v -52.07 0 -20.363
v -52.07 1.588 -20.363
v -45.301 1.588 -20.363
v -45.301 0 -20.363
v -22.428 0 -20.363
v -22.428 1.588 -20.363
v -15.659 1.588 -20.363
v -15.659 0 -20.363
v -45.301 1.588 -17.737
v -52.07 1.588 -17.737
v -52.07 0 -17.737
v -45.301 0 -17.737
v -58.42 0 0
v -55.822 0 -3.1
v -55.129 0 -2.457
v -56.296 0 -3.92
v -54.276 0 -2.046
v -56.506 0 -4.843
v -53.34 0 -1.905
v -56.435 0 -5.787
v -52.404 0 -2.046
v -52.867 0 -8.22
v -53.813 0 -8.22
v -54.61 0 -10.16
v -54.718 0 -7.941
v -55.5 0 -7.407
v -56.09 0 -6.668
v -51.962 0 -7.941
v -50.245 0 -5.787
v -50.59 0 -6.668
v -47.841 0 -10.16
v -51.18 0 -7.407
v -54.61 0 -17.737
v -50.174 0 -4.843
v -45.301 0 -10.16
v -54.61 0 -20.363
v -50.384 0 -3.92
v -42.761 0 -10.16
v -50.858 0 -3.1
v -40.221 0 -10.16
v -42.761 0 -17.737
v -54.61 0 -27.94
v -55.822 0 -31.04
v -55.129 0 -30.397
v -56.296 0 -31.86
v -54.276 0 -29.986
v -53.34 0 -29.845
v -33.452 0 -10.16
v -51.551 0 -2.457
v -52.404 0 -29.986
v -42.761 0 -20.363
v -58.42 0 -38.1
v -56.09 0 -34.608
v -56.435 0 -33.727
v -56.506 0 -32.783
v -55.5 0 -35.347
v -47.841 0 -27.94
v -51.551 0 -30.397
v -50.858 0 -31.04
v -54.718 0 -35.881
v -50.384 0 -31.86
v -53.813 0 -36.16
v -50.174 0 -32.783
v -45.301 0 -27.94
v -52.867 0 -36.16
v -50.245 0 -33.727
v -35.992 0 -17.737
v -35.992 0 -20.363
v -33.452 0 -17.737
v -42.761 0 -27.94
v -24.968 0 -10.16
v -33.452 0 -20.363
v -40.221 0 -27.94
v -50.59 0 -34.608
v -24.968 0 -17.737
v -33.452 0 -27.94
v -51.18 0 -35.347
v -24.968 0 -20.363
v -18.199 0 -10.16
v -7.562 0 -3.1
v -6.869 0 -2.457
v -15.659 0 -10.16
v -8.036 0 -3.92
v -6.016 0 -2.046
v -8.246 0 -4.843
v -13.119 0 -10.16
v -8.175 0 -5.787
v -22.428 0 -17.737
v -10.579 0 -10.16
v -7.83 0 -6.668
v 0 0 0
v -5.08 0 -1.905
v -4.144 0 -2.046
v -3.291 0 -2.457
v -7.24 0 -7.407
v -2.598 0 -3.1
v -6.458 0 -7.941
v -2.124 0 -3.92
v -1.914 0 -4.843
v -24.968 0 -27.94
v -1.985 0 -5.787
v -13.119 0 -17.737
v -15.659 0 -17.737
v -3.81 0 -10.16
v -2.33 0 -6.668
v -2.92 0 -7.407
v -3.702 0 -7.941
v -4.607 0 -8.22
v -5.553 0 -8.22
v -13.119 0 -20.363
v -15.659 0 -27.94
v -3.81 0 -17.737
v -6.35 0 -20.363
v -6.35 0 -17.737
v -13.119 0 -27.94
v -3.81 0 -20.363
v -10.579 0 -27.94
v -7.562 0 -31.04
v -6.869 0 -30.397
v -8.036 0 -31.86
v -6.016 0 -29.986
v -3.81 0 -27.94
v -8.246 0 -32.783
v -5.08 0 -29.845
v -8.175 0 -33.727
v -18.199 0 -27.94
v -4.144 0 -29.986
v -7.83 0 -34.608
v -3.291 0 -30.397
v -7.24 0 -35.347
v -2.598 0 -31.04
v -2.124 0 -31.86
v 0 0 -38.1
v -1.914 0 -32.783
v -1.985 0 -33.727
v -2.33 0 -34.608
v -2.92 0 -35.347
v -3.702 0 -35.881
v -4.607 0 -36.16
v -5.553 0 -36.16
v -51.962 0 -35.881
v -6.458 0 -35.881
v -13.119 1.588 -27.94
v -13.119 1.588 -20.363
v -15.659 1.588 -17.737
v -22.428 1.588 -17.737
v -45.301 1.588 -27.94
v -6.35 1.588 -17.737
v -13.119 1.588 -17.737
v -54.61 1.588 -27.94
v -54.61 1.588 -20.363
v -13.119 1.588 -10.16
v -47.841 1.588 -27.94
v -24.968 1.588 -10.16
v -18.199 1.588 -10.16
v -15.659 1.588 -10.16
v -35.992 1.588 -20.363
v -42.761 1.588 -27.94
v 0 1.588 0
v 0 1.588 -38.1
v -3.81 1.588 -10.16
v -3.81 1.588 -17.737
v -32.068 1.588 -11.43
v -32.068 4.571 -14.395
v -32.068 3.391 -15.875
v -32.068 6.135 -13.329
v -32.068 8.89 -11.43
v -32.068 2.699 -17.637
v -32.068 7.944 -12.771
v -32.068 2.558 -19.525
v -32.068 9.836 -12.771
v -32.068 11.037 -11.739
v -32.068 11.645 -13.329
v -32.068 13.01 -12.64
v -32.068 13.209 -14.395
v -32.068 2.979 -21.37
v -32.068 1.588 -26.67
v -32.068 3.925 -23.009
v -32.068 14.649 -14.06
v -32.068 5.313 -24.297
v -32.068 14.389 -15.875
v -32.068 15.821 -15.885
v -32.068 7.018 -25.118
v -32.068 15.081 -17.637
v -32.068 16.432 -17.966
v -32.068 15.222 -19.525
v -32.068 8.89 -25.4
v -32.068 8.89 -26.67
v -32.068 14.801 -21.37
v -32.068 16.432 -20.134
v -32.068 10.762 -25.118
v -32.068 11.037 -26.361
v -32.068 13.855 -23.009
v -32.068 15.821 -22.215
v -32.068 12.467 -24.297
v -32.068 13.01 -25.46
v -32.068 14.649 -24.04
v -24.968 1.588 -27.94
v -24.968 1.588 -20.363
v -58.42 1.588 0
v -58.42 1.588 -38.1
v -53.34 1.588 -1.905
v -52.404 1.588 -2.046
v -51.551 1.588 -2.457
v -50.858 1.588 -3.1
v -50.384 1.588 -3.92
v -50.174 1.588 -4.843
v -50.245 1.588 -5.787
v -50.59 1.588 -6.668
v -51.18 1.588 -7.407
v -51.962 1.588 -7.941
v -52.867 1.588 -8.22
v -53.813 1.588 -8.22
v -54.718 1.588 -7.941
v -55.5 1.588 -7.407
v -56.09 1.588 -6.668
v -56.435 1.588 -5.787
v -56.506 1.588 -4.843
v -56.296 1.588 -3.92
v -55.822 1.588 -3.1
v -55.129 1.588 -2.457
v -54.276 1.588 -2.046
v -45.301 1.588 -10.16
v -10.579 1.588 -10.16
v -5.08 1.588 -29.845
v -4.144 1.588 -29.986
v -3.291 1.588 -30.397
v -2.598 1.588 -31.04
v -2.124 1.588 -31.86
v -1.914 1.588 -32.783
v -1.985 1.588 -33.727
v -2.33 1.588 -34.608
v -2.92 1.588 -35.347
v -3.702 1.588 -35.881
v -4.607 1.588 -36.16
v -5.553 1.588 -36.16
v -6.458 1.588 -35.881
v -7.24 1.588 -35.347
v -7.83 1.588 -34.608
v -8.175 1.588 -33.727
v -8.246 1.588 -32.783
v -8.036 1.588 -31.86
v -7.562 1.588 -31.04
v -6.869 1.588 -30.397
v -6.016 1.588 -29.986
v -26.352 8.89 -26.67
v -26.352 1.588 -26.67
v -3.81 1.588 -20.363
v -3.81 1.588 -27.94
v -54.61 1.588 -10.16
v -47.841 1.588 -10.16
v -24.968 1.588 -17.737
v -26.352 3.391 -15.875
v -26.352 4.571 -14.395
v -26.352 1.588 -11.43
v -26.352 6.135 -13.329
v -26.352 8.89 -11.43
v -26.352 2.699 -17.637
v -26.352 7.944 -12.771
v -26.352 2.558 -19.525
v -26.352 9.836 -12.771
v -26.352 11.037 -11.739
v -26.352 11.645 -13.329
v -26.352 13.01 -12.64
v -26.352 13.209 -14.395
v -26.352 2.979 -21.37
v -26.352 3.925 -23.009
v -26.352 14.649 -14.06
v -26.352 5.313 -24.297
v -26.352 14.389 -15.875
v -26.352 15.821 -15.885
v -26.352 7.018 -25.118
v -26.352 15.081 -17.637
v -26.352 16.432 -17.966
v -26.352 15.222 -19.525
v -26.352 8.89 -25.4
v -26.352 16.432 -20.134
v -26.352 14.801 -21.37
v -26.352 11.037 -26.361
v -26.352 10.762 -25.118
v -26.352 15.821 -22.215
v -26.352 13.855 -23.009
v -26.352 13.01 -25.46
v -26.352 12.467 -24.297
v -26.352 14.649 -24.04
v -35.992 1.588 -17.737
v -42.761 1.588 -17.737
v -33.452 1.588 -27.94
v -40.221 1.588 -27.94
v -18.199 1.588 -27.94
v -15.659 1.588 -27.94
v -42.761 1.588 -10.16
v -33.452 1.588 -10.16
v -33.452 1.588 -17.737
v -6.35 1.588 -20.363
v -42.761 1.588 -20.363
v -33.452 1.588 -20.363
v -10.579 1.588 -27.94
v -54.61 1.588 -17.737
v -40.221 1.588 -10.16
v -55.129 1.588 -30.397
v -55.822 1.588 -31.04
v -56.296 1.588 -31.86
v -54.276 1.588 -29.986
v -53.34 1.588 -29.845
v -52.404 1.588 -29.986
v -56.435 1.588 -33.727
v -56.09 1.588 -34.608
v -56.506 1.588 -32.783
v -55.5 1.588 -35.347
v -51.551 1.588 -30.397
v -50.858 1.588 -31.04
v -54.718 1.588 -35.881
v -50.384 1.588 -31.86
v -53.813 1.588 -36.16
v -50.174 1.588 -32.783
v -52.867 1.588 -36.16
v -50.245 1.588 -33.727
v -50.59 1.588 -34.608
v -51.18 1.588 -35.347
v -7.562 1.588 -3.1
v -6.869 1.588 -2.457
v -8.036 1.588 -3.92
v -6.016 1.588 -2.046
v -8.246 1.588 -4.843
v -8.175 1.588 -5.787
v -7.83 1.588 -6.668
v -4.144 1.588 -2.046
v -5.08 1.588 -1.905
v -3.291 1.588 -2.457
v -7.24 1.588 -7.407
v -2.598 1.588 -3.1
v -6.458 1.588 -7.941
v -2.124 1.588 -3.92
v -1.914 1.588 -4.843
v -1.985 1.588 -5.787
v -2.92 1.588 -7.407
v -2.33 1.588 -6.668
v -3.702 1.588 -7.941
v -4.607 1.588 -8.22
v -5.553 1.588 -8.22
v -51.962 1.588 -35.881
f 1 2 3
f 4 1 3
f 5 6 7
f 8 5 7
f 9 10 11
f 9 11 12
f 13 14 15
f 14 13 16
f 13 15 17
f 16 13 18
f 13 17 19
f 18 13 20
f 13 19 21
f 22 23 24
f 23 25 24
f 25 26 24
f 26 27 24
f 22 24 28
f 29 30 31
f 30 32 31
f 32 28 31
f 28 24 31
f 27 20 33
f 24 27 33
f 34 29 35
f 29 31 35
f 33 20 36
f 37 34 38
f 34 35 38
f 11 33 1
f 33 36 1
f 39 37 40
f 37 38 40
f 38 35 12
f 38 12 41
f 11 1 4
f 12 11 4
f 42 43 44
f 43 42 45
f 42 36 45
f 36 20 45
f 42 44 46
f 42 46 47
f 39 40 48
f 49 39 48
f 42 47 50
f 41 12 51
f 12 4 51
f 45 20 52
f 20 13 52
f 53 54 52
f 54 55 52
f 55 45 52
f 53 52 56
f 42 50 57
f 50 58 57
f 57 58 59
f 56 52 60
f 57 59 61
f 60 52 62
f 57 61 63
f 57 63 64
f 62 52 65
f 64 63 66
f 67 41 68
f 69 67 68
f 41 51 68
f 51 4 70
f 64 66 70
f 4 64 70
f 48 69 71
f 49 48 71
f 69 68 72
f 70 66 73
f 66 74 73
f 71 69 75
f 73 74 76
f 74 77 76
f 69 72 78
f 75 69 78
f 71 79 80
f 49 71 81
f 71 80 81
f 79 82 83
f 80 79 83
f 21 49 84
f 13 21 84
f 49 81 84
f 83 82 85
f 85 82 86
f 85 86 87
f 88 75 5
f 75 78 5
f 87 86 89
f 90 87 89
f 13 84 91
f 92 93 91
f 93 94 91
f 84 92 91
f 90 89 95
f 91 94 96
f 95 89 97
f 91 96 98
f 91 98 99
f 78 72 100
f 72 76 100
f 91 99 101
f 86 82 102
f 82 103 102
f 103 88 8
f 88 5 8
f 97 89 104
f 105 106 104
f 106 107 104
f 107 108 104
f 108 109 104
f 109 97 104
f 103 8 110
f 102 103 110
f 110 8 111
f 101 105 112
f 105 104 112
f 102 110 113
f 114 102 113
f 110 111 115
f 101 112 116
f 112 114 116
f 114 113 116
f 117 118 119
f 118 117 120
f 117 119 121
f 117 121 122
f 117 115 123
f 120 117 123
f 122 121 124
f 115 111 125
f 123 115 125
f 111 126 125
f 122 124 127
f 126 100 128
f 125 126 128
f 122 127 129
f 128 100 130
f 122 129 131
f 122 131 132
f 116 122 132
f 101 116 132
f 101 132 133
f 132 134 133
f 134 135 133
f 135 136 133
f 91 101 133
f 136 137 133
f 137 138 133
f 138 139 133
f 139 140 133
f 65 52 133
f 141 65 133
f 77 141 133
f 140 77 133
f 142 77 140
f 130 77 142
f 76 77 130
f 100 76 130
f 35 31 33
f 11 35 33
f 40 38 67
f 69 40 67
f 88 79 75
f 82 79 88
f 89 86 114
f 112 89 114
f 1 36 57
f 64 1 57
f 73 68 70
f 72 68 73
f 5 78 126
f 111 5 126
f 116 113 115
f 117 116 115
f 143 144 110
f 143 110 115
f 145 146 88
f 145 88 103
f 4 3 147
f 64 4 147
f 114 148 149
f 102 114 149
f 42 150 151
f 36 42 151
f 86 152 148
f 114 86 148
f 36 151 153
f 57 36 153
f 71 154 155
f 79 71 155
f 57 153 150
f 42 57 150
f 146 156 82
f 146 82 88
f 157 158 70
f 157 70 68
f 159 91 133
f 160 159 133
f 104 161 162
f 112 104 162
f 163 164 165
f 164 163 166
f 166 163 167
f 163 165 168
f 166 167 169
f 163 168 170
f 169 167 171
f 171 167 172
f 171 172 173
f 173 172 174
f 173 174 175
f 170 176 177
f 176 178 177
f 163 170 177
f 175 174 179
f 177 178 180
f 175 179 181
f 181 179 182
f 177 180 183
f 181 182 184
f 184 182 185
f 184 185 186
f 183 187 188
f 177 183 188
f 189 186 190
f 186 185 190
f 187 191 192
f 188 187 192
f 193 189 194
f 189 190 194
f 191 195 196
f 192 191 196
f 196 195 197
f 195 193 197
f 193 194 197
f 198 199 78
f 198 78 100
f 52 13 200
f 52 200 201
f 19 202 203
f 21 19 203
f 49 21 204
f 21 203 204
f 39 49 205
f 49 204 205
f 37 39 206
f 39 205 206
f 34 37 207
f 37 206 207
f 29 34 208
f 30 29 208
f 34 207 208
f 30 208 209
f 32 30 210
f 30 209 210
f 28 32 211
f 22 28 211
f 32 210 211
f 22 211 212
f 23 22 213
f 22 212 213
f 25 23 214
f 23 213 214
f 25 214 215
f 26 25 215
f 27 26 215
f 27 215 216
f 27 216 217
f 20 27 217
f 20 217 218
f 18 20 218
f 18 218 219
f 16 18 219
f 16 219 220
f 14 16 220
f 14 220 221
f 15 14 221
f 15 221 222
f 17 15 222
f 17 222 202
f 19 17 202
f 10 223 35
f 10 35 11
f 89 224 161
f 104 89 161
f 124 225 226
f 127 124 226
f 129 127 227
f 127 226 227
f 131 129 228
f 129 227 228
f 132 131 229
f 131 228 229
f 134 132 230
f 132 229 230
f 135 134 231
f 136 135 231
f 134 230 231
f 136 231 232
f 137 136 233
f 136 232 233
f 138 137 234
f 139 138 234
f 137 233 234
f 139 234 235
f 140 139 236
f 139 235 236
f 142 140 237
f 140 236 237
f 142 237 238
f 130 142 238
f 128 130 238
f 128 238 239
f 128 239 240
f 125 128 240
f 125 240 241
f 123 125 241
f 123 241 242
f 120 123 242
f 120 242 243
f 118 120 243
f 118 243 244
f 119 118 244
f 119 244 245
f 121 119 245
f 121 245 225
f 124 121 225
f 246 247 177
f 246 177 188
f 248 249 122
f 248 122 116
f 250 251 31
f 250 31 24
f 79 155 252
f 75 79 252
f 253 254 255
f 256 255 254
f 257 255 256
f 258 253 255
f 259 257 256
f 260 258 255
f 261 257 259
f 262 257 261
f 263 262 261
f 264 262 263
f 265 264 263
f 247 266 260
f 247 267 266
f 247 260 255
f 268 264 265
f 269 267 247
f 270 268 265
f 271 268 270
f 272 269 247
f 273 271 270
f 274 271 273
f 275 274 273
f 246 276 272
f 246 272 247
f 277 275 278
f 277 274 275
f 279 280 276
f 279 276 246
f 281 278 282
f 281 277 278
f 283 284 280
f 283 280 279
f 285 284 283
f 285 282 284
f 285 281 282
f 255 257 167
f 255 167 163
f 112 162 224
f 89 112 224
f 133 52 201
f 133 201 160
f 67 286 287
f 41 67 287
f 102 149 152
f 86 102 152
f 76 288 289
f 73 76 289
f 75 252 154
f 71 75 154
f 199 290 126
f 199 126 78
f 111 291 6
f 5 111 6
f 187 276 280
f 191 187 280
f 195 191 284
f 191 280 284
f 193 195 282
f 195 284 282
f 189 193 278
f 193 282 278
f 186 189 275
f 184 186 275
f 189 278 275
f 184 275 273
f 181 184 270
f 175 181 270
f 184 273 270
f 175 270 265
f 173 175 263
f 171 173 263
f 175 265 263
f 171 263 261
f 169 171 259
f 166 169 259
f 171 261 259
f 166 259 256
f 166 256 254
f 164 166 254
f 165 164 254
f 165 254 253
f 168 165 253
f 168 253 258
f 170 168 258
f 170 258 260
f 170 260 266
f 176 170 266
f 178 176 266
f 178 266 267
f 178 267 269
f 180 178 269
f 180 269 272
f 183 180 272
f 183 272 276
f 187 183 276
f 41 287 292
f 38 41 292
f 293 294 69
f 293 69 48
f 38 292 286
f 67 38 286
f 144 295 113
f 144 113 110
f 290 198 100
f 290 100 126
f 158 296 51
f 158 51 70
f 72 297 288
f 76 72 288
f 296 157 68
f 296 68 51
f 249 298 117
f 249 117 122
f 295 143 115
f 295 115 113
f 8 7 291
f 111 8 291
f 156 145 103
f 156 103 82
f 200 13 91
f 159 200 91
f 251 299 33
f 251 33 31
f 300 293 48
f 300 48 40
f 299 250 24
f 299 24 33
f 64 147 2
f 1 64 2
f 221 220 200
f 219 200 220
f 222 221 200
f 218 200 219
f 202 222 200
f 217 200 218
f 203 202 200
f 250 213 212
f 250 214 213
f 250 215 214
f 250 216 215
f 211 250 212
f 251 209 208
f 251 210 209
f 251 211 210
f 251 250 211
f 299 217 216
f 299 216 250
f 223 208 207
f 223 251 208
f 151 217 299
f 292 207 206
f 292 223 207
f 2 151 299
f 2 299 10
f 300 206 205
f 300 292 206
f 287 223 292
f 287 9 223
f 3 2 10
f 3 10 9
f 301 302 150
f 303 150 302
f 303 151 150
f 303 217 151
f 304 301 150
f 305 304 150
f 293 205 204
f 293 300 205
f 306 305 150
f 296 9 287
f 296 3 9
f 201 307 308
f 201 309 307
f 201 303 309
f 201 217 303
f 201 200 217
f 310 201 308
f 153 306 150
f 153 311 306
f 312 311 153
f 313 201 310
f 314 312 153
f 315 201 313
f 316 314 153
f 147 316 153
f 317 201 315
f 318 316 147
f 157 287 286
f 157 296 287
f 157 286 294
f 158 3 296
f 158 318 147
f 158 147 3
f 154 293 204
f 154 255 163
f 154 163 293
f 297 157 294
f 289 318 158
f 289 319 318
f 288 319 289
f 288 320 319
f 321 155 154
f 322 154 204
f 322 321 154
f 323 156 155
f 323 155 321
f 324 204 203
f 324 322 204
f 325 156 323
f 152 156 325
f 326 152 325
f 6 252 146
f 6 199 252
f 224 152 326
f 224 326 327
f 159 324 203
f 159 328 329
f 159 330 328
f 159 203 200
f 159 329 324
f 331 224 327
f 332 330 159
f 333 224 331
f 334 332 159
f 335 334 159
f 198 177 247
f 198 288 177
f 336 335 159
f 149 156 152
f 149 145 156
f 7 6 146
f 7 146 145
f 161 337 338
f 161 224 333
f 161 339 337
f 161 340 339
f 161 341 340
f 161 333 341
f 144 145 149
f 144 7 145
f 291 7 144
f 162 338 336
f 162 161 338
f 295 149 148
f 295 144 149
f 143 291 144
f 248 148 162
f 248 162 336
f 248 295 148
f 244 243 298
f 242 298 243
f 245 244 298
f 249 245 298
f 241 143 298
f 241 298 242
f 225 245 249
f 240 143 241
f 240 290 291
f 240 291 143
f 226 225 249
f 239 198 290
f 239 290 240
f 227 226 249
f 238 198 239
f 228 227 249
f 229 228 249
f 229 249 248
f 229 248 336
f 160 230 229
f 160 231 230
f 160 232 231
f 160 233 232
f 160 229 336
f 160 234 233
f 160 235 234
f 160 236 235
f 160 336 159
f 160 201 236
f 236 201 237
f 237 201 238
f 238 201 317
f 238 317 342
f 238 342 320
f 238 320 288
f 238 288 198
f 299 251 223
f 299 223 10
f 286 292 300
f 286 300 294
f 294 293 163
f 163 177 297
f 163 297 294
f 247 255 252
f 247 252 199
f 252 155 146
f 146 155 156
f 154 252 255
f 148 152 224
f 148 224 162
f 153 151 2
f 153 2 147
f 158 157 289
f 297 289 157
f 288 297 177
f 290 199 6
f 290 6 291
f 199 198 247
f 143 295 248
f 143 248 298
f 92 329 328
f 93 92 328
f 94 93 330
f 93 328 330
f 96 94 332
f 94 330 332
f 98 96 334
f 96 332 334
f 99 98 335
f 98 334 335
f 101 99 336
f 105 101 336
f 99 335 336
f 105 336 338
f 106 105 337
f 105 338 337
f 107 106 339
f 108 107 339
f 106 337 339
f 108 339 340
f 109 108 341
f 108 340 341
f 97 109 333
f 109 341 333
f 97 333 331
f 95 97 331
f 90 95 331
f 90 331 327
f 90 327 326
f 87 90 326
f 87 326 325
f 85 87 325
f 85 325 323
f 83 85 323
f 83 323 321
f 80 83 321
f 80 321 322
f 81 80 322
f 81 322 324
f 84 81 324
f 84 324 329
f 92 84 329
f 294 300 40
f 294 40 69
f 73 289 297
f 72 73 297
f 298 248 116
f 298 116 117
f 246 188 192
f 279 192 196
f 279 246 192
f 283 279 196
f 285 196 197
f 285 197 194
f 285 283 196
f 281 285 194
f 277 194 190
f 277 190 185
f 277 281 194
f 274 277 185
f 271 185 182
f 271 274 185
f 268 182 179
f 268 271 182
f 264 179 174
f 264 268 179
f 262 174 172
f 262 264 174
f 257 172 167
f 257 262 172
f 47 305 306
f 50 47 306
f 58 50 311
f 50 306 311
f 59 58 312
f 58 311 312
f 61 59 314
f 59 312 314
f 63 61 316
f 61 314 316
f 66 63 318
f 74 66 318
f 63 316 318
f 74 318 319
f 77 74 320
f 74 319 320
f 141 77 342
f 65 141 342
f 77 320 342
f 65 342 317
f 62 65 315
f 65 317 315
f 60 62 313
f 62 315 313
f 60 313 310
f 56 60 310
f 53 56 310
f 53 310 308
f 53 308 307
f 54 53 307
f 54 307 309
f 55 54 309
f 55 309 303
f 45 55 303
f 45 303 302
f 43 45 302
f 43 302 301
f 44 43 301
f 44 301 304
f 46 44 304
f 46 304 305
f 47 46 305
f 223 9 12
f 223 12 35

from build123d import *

# Parameters (mm, degrees)
SKETCH1_W            = 58.42
SKETCH1_H            = 38.1
BOSS_EXTRUDE1_DEPTH  = 1.5875
BOSS_EXTRUDE2_DEPTH  = 2.8575
SKETCH4_R            = 6.35
CUT_EXTRUDE1_DEPTH   = 53.464413236
CUT_EXTRUDE2_DEPTH   = 72.324521774
MIRROR4_COPY_1_DEPTH = 72.324521774
SKETCH6_R            = 3.175
CUT_EXTRUDE3_DEPTH   = 72.324521774


with BuildPart() as part:
    # Sketch1 → Boss-Extrude1 (new body)
    with BuildSketch(Plane(origin=(0, 0, 0), x_dir=(1, 0, 0), z_dir=(0, 1, 0))):
        with Locations((-29.21, 19.05)):
            Rectangle(SKETCH1_W, SKETCH1_H)
    extrude(amount=BOSS_EXTRUDE1_DEPTH)

    # Sketch2 → Boss-Extrude2 (add, symmetric)
    with BuildSketch(Plane(origin=(-29.21, 0, 0), x_dir=(0, 0, -1), z_dir=(1, 0, 0))):
        with BuildLine():
            Line((11.43, 8.89), (11.43, 0))
            Line((11.43, 0), (26.67, 0))
            Line((26.67, 0), (26.67, 8.89))
            ThreePointArc((26.67, 8.89), (19.05, 16.51), (11.43, 8.89))
        make_face()
    extrude(amount=BOSS_EXTRUDE2_DEPTH, both=True)

    # Sketch4 → Cut-Extrude1 (cut, through all)
    with BuildSketch(Plane(origin=(-26.3525, 0, 0), x_dir=(0, 0, -1), z_dir=(1, 0, 0))):
        with Locations((19.05, 8.89)):
            Circle(SKETCH4_R)
    extrude(amount=-CUT_EXTRUDE1_DEPTH, mode=Mode.SUBTRACT)

    # Sketch5 → Cut-Extrude2 (cut, through all)
    with BuildSketch(Plane(origin=(0, 1.5875, 0), x_dir=(1, 0, 0), z_dir=(0, 1, 0))):
        Polygon((-54.61, 27.94), (-54.61, 20.363487121), (-47.840801185, 27.94), align=None)
        Polygon((-45.300801185, 27.94), (-52.07, 20.363487121), (-45.300801185, 20.363487121), align=None)
        Polygon((-42.760801185, 20.363487121), (-42.760801185, 27.94), (-35.99160237, 20.363487121), align=None)
        Polygon((-40.220801185, 27.94), (-33.45160237, 20.363487121), (-33.45160237, 27.94), align=None)
    cut_extrude2 = extrude(amount=-CUT_EXTRUDE2_DEPTH, mode=Mode.SUBTRACT)

    # Mirror2: Cut-Extrude2 across plane
    add(cut_extrude2.mirror(Plane(origin=(0, 0, -19.05), x_dir=(1, 0, 0), z_dir=(0, 0, -1))), mode=Mode.SUBTRACT)

    # Mirror3: Cut-Extrude2 across plane
    add(cut_extrude2.mirror(Plane(origin=(-29.21, 0, 0), x_dir=(0, 0, 1), z_dir=(1, 0, 0))), mode=Mode.SUBTRACT)

    # Mirror4 copy 1 sketch → Mirror4 copy 1 (cut, through all)
    with BuildSketch(Plane(origin=(-58.42, 1.5875, -38.1), x_dir=(-1, 0, 0), z_dir=(0, 1, 0))):
        Polygon((-54.61, 27.94), (-54.61, 20.363487121), (-47.840801185, 27.94), align=None)
        Polygon((-45.300801185, 27.94), (-52.07, 20.363487121), (-45.300801185, 20.363487121), align=None)
        Polygon((-42.760801185, 20.363487121), (-42.760801185, 27.94), (-35.99160237, 20.363487121), align=None)
        Polygon((-40.220801185, 27.94), (-33.45160237, 20.363487121), (-33.45160237, 27.94), align=None)
    extrude(amount=-MIRROR4_COPY_1_DEPTH, mode=Mode.SUBTRACT)

    # Sketch6 → Cut-Extrude3 (cut, through all)
    with BuildSketch(Plane(origin=(0, 1.5875, 0), x_dir=(1, 0, 0), z_dir=(0, 1, 0))):
        with Locations(Location((-53.34, 33.02, 0), (0, 0, 270))):
            Circle(SKETCH6_R)
        with Locations(Location((-5.08, 33.02, 0), (0, 0, 270))):
            Circle(SKETCH6_R)
        with Locations(Location((-5.08, 5.08, 0), (0, 0, 270))):
            Circle(SKETCH6_R)
        with Locations(Location((-53.34, 5.08, 0), (0, 0, 270))):
            Circle(SKETCH6_R)
    extrude(amount=-CUT_EXTRUDE3_DEPTH, mode=Mode.SUBTRACT)


solid = part.part
